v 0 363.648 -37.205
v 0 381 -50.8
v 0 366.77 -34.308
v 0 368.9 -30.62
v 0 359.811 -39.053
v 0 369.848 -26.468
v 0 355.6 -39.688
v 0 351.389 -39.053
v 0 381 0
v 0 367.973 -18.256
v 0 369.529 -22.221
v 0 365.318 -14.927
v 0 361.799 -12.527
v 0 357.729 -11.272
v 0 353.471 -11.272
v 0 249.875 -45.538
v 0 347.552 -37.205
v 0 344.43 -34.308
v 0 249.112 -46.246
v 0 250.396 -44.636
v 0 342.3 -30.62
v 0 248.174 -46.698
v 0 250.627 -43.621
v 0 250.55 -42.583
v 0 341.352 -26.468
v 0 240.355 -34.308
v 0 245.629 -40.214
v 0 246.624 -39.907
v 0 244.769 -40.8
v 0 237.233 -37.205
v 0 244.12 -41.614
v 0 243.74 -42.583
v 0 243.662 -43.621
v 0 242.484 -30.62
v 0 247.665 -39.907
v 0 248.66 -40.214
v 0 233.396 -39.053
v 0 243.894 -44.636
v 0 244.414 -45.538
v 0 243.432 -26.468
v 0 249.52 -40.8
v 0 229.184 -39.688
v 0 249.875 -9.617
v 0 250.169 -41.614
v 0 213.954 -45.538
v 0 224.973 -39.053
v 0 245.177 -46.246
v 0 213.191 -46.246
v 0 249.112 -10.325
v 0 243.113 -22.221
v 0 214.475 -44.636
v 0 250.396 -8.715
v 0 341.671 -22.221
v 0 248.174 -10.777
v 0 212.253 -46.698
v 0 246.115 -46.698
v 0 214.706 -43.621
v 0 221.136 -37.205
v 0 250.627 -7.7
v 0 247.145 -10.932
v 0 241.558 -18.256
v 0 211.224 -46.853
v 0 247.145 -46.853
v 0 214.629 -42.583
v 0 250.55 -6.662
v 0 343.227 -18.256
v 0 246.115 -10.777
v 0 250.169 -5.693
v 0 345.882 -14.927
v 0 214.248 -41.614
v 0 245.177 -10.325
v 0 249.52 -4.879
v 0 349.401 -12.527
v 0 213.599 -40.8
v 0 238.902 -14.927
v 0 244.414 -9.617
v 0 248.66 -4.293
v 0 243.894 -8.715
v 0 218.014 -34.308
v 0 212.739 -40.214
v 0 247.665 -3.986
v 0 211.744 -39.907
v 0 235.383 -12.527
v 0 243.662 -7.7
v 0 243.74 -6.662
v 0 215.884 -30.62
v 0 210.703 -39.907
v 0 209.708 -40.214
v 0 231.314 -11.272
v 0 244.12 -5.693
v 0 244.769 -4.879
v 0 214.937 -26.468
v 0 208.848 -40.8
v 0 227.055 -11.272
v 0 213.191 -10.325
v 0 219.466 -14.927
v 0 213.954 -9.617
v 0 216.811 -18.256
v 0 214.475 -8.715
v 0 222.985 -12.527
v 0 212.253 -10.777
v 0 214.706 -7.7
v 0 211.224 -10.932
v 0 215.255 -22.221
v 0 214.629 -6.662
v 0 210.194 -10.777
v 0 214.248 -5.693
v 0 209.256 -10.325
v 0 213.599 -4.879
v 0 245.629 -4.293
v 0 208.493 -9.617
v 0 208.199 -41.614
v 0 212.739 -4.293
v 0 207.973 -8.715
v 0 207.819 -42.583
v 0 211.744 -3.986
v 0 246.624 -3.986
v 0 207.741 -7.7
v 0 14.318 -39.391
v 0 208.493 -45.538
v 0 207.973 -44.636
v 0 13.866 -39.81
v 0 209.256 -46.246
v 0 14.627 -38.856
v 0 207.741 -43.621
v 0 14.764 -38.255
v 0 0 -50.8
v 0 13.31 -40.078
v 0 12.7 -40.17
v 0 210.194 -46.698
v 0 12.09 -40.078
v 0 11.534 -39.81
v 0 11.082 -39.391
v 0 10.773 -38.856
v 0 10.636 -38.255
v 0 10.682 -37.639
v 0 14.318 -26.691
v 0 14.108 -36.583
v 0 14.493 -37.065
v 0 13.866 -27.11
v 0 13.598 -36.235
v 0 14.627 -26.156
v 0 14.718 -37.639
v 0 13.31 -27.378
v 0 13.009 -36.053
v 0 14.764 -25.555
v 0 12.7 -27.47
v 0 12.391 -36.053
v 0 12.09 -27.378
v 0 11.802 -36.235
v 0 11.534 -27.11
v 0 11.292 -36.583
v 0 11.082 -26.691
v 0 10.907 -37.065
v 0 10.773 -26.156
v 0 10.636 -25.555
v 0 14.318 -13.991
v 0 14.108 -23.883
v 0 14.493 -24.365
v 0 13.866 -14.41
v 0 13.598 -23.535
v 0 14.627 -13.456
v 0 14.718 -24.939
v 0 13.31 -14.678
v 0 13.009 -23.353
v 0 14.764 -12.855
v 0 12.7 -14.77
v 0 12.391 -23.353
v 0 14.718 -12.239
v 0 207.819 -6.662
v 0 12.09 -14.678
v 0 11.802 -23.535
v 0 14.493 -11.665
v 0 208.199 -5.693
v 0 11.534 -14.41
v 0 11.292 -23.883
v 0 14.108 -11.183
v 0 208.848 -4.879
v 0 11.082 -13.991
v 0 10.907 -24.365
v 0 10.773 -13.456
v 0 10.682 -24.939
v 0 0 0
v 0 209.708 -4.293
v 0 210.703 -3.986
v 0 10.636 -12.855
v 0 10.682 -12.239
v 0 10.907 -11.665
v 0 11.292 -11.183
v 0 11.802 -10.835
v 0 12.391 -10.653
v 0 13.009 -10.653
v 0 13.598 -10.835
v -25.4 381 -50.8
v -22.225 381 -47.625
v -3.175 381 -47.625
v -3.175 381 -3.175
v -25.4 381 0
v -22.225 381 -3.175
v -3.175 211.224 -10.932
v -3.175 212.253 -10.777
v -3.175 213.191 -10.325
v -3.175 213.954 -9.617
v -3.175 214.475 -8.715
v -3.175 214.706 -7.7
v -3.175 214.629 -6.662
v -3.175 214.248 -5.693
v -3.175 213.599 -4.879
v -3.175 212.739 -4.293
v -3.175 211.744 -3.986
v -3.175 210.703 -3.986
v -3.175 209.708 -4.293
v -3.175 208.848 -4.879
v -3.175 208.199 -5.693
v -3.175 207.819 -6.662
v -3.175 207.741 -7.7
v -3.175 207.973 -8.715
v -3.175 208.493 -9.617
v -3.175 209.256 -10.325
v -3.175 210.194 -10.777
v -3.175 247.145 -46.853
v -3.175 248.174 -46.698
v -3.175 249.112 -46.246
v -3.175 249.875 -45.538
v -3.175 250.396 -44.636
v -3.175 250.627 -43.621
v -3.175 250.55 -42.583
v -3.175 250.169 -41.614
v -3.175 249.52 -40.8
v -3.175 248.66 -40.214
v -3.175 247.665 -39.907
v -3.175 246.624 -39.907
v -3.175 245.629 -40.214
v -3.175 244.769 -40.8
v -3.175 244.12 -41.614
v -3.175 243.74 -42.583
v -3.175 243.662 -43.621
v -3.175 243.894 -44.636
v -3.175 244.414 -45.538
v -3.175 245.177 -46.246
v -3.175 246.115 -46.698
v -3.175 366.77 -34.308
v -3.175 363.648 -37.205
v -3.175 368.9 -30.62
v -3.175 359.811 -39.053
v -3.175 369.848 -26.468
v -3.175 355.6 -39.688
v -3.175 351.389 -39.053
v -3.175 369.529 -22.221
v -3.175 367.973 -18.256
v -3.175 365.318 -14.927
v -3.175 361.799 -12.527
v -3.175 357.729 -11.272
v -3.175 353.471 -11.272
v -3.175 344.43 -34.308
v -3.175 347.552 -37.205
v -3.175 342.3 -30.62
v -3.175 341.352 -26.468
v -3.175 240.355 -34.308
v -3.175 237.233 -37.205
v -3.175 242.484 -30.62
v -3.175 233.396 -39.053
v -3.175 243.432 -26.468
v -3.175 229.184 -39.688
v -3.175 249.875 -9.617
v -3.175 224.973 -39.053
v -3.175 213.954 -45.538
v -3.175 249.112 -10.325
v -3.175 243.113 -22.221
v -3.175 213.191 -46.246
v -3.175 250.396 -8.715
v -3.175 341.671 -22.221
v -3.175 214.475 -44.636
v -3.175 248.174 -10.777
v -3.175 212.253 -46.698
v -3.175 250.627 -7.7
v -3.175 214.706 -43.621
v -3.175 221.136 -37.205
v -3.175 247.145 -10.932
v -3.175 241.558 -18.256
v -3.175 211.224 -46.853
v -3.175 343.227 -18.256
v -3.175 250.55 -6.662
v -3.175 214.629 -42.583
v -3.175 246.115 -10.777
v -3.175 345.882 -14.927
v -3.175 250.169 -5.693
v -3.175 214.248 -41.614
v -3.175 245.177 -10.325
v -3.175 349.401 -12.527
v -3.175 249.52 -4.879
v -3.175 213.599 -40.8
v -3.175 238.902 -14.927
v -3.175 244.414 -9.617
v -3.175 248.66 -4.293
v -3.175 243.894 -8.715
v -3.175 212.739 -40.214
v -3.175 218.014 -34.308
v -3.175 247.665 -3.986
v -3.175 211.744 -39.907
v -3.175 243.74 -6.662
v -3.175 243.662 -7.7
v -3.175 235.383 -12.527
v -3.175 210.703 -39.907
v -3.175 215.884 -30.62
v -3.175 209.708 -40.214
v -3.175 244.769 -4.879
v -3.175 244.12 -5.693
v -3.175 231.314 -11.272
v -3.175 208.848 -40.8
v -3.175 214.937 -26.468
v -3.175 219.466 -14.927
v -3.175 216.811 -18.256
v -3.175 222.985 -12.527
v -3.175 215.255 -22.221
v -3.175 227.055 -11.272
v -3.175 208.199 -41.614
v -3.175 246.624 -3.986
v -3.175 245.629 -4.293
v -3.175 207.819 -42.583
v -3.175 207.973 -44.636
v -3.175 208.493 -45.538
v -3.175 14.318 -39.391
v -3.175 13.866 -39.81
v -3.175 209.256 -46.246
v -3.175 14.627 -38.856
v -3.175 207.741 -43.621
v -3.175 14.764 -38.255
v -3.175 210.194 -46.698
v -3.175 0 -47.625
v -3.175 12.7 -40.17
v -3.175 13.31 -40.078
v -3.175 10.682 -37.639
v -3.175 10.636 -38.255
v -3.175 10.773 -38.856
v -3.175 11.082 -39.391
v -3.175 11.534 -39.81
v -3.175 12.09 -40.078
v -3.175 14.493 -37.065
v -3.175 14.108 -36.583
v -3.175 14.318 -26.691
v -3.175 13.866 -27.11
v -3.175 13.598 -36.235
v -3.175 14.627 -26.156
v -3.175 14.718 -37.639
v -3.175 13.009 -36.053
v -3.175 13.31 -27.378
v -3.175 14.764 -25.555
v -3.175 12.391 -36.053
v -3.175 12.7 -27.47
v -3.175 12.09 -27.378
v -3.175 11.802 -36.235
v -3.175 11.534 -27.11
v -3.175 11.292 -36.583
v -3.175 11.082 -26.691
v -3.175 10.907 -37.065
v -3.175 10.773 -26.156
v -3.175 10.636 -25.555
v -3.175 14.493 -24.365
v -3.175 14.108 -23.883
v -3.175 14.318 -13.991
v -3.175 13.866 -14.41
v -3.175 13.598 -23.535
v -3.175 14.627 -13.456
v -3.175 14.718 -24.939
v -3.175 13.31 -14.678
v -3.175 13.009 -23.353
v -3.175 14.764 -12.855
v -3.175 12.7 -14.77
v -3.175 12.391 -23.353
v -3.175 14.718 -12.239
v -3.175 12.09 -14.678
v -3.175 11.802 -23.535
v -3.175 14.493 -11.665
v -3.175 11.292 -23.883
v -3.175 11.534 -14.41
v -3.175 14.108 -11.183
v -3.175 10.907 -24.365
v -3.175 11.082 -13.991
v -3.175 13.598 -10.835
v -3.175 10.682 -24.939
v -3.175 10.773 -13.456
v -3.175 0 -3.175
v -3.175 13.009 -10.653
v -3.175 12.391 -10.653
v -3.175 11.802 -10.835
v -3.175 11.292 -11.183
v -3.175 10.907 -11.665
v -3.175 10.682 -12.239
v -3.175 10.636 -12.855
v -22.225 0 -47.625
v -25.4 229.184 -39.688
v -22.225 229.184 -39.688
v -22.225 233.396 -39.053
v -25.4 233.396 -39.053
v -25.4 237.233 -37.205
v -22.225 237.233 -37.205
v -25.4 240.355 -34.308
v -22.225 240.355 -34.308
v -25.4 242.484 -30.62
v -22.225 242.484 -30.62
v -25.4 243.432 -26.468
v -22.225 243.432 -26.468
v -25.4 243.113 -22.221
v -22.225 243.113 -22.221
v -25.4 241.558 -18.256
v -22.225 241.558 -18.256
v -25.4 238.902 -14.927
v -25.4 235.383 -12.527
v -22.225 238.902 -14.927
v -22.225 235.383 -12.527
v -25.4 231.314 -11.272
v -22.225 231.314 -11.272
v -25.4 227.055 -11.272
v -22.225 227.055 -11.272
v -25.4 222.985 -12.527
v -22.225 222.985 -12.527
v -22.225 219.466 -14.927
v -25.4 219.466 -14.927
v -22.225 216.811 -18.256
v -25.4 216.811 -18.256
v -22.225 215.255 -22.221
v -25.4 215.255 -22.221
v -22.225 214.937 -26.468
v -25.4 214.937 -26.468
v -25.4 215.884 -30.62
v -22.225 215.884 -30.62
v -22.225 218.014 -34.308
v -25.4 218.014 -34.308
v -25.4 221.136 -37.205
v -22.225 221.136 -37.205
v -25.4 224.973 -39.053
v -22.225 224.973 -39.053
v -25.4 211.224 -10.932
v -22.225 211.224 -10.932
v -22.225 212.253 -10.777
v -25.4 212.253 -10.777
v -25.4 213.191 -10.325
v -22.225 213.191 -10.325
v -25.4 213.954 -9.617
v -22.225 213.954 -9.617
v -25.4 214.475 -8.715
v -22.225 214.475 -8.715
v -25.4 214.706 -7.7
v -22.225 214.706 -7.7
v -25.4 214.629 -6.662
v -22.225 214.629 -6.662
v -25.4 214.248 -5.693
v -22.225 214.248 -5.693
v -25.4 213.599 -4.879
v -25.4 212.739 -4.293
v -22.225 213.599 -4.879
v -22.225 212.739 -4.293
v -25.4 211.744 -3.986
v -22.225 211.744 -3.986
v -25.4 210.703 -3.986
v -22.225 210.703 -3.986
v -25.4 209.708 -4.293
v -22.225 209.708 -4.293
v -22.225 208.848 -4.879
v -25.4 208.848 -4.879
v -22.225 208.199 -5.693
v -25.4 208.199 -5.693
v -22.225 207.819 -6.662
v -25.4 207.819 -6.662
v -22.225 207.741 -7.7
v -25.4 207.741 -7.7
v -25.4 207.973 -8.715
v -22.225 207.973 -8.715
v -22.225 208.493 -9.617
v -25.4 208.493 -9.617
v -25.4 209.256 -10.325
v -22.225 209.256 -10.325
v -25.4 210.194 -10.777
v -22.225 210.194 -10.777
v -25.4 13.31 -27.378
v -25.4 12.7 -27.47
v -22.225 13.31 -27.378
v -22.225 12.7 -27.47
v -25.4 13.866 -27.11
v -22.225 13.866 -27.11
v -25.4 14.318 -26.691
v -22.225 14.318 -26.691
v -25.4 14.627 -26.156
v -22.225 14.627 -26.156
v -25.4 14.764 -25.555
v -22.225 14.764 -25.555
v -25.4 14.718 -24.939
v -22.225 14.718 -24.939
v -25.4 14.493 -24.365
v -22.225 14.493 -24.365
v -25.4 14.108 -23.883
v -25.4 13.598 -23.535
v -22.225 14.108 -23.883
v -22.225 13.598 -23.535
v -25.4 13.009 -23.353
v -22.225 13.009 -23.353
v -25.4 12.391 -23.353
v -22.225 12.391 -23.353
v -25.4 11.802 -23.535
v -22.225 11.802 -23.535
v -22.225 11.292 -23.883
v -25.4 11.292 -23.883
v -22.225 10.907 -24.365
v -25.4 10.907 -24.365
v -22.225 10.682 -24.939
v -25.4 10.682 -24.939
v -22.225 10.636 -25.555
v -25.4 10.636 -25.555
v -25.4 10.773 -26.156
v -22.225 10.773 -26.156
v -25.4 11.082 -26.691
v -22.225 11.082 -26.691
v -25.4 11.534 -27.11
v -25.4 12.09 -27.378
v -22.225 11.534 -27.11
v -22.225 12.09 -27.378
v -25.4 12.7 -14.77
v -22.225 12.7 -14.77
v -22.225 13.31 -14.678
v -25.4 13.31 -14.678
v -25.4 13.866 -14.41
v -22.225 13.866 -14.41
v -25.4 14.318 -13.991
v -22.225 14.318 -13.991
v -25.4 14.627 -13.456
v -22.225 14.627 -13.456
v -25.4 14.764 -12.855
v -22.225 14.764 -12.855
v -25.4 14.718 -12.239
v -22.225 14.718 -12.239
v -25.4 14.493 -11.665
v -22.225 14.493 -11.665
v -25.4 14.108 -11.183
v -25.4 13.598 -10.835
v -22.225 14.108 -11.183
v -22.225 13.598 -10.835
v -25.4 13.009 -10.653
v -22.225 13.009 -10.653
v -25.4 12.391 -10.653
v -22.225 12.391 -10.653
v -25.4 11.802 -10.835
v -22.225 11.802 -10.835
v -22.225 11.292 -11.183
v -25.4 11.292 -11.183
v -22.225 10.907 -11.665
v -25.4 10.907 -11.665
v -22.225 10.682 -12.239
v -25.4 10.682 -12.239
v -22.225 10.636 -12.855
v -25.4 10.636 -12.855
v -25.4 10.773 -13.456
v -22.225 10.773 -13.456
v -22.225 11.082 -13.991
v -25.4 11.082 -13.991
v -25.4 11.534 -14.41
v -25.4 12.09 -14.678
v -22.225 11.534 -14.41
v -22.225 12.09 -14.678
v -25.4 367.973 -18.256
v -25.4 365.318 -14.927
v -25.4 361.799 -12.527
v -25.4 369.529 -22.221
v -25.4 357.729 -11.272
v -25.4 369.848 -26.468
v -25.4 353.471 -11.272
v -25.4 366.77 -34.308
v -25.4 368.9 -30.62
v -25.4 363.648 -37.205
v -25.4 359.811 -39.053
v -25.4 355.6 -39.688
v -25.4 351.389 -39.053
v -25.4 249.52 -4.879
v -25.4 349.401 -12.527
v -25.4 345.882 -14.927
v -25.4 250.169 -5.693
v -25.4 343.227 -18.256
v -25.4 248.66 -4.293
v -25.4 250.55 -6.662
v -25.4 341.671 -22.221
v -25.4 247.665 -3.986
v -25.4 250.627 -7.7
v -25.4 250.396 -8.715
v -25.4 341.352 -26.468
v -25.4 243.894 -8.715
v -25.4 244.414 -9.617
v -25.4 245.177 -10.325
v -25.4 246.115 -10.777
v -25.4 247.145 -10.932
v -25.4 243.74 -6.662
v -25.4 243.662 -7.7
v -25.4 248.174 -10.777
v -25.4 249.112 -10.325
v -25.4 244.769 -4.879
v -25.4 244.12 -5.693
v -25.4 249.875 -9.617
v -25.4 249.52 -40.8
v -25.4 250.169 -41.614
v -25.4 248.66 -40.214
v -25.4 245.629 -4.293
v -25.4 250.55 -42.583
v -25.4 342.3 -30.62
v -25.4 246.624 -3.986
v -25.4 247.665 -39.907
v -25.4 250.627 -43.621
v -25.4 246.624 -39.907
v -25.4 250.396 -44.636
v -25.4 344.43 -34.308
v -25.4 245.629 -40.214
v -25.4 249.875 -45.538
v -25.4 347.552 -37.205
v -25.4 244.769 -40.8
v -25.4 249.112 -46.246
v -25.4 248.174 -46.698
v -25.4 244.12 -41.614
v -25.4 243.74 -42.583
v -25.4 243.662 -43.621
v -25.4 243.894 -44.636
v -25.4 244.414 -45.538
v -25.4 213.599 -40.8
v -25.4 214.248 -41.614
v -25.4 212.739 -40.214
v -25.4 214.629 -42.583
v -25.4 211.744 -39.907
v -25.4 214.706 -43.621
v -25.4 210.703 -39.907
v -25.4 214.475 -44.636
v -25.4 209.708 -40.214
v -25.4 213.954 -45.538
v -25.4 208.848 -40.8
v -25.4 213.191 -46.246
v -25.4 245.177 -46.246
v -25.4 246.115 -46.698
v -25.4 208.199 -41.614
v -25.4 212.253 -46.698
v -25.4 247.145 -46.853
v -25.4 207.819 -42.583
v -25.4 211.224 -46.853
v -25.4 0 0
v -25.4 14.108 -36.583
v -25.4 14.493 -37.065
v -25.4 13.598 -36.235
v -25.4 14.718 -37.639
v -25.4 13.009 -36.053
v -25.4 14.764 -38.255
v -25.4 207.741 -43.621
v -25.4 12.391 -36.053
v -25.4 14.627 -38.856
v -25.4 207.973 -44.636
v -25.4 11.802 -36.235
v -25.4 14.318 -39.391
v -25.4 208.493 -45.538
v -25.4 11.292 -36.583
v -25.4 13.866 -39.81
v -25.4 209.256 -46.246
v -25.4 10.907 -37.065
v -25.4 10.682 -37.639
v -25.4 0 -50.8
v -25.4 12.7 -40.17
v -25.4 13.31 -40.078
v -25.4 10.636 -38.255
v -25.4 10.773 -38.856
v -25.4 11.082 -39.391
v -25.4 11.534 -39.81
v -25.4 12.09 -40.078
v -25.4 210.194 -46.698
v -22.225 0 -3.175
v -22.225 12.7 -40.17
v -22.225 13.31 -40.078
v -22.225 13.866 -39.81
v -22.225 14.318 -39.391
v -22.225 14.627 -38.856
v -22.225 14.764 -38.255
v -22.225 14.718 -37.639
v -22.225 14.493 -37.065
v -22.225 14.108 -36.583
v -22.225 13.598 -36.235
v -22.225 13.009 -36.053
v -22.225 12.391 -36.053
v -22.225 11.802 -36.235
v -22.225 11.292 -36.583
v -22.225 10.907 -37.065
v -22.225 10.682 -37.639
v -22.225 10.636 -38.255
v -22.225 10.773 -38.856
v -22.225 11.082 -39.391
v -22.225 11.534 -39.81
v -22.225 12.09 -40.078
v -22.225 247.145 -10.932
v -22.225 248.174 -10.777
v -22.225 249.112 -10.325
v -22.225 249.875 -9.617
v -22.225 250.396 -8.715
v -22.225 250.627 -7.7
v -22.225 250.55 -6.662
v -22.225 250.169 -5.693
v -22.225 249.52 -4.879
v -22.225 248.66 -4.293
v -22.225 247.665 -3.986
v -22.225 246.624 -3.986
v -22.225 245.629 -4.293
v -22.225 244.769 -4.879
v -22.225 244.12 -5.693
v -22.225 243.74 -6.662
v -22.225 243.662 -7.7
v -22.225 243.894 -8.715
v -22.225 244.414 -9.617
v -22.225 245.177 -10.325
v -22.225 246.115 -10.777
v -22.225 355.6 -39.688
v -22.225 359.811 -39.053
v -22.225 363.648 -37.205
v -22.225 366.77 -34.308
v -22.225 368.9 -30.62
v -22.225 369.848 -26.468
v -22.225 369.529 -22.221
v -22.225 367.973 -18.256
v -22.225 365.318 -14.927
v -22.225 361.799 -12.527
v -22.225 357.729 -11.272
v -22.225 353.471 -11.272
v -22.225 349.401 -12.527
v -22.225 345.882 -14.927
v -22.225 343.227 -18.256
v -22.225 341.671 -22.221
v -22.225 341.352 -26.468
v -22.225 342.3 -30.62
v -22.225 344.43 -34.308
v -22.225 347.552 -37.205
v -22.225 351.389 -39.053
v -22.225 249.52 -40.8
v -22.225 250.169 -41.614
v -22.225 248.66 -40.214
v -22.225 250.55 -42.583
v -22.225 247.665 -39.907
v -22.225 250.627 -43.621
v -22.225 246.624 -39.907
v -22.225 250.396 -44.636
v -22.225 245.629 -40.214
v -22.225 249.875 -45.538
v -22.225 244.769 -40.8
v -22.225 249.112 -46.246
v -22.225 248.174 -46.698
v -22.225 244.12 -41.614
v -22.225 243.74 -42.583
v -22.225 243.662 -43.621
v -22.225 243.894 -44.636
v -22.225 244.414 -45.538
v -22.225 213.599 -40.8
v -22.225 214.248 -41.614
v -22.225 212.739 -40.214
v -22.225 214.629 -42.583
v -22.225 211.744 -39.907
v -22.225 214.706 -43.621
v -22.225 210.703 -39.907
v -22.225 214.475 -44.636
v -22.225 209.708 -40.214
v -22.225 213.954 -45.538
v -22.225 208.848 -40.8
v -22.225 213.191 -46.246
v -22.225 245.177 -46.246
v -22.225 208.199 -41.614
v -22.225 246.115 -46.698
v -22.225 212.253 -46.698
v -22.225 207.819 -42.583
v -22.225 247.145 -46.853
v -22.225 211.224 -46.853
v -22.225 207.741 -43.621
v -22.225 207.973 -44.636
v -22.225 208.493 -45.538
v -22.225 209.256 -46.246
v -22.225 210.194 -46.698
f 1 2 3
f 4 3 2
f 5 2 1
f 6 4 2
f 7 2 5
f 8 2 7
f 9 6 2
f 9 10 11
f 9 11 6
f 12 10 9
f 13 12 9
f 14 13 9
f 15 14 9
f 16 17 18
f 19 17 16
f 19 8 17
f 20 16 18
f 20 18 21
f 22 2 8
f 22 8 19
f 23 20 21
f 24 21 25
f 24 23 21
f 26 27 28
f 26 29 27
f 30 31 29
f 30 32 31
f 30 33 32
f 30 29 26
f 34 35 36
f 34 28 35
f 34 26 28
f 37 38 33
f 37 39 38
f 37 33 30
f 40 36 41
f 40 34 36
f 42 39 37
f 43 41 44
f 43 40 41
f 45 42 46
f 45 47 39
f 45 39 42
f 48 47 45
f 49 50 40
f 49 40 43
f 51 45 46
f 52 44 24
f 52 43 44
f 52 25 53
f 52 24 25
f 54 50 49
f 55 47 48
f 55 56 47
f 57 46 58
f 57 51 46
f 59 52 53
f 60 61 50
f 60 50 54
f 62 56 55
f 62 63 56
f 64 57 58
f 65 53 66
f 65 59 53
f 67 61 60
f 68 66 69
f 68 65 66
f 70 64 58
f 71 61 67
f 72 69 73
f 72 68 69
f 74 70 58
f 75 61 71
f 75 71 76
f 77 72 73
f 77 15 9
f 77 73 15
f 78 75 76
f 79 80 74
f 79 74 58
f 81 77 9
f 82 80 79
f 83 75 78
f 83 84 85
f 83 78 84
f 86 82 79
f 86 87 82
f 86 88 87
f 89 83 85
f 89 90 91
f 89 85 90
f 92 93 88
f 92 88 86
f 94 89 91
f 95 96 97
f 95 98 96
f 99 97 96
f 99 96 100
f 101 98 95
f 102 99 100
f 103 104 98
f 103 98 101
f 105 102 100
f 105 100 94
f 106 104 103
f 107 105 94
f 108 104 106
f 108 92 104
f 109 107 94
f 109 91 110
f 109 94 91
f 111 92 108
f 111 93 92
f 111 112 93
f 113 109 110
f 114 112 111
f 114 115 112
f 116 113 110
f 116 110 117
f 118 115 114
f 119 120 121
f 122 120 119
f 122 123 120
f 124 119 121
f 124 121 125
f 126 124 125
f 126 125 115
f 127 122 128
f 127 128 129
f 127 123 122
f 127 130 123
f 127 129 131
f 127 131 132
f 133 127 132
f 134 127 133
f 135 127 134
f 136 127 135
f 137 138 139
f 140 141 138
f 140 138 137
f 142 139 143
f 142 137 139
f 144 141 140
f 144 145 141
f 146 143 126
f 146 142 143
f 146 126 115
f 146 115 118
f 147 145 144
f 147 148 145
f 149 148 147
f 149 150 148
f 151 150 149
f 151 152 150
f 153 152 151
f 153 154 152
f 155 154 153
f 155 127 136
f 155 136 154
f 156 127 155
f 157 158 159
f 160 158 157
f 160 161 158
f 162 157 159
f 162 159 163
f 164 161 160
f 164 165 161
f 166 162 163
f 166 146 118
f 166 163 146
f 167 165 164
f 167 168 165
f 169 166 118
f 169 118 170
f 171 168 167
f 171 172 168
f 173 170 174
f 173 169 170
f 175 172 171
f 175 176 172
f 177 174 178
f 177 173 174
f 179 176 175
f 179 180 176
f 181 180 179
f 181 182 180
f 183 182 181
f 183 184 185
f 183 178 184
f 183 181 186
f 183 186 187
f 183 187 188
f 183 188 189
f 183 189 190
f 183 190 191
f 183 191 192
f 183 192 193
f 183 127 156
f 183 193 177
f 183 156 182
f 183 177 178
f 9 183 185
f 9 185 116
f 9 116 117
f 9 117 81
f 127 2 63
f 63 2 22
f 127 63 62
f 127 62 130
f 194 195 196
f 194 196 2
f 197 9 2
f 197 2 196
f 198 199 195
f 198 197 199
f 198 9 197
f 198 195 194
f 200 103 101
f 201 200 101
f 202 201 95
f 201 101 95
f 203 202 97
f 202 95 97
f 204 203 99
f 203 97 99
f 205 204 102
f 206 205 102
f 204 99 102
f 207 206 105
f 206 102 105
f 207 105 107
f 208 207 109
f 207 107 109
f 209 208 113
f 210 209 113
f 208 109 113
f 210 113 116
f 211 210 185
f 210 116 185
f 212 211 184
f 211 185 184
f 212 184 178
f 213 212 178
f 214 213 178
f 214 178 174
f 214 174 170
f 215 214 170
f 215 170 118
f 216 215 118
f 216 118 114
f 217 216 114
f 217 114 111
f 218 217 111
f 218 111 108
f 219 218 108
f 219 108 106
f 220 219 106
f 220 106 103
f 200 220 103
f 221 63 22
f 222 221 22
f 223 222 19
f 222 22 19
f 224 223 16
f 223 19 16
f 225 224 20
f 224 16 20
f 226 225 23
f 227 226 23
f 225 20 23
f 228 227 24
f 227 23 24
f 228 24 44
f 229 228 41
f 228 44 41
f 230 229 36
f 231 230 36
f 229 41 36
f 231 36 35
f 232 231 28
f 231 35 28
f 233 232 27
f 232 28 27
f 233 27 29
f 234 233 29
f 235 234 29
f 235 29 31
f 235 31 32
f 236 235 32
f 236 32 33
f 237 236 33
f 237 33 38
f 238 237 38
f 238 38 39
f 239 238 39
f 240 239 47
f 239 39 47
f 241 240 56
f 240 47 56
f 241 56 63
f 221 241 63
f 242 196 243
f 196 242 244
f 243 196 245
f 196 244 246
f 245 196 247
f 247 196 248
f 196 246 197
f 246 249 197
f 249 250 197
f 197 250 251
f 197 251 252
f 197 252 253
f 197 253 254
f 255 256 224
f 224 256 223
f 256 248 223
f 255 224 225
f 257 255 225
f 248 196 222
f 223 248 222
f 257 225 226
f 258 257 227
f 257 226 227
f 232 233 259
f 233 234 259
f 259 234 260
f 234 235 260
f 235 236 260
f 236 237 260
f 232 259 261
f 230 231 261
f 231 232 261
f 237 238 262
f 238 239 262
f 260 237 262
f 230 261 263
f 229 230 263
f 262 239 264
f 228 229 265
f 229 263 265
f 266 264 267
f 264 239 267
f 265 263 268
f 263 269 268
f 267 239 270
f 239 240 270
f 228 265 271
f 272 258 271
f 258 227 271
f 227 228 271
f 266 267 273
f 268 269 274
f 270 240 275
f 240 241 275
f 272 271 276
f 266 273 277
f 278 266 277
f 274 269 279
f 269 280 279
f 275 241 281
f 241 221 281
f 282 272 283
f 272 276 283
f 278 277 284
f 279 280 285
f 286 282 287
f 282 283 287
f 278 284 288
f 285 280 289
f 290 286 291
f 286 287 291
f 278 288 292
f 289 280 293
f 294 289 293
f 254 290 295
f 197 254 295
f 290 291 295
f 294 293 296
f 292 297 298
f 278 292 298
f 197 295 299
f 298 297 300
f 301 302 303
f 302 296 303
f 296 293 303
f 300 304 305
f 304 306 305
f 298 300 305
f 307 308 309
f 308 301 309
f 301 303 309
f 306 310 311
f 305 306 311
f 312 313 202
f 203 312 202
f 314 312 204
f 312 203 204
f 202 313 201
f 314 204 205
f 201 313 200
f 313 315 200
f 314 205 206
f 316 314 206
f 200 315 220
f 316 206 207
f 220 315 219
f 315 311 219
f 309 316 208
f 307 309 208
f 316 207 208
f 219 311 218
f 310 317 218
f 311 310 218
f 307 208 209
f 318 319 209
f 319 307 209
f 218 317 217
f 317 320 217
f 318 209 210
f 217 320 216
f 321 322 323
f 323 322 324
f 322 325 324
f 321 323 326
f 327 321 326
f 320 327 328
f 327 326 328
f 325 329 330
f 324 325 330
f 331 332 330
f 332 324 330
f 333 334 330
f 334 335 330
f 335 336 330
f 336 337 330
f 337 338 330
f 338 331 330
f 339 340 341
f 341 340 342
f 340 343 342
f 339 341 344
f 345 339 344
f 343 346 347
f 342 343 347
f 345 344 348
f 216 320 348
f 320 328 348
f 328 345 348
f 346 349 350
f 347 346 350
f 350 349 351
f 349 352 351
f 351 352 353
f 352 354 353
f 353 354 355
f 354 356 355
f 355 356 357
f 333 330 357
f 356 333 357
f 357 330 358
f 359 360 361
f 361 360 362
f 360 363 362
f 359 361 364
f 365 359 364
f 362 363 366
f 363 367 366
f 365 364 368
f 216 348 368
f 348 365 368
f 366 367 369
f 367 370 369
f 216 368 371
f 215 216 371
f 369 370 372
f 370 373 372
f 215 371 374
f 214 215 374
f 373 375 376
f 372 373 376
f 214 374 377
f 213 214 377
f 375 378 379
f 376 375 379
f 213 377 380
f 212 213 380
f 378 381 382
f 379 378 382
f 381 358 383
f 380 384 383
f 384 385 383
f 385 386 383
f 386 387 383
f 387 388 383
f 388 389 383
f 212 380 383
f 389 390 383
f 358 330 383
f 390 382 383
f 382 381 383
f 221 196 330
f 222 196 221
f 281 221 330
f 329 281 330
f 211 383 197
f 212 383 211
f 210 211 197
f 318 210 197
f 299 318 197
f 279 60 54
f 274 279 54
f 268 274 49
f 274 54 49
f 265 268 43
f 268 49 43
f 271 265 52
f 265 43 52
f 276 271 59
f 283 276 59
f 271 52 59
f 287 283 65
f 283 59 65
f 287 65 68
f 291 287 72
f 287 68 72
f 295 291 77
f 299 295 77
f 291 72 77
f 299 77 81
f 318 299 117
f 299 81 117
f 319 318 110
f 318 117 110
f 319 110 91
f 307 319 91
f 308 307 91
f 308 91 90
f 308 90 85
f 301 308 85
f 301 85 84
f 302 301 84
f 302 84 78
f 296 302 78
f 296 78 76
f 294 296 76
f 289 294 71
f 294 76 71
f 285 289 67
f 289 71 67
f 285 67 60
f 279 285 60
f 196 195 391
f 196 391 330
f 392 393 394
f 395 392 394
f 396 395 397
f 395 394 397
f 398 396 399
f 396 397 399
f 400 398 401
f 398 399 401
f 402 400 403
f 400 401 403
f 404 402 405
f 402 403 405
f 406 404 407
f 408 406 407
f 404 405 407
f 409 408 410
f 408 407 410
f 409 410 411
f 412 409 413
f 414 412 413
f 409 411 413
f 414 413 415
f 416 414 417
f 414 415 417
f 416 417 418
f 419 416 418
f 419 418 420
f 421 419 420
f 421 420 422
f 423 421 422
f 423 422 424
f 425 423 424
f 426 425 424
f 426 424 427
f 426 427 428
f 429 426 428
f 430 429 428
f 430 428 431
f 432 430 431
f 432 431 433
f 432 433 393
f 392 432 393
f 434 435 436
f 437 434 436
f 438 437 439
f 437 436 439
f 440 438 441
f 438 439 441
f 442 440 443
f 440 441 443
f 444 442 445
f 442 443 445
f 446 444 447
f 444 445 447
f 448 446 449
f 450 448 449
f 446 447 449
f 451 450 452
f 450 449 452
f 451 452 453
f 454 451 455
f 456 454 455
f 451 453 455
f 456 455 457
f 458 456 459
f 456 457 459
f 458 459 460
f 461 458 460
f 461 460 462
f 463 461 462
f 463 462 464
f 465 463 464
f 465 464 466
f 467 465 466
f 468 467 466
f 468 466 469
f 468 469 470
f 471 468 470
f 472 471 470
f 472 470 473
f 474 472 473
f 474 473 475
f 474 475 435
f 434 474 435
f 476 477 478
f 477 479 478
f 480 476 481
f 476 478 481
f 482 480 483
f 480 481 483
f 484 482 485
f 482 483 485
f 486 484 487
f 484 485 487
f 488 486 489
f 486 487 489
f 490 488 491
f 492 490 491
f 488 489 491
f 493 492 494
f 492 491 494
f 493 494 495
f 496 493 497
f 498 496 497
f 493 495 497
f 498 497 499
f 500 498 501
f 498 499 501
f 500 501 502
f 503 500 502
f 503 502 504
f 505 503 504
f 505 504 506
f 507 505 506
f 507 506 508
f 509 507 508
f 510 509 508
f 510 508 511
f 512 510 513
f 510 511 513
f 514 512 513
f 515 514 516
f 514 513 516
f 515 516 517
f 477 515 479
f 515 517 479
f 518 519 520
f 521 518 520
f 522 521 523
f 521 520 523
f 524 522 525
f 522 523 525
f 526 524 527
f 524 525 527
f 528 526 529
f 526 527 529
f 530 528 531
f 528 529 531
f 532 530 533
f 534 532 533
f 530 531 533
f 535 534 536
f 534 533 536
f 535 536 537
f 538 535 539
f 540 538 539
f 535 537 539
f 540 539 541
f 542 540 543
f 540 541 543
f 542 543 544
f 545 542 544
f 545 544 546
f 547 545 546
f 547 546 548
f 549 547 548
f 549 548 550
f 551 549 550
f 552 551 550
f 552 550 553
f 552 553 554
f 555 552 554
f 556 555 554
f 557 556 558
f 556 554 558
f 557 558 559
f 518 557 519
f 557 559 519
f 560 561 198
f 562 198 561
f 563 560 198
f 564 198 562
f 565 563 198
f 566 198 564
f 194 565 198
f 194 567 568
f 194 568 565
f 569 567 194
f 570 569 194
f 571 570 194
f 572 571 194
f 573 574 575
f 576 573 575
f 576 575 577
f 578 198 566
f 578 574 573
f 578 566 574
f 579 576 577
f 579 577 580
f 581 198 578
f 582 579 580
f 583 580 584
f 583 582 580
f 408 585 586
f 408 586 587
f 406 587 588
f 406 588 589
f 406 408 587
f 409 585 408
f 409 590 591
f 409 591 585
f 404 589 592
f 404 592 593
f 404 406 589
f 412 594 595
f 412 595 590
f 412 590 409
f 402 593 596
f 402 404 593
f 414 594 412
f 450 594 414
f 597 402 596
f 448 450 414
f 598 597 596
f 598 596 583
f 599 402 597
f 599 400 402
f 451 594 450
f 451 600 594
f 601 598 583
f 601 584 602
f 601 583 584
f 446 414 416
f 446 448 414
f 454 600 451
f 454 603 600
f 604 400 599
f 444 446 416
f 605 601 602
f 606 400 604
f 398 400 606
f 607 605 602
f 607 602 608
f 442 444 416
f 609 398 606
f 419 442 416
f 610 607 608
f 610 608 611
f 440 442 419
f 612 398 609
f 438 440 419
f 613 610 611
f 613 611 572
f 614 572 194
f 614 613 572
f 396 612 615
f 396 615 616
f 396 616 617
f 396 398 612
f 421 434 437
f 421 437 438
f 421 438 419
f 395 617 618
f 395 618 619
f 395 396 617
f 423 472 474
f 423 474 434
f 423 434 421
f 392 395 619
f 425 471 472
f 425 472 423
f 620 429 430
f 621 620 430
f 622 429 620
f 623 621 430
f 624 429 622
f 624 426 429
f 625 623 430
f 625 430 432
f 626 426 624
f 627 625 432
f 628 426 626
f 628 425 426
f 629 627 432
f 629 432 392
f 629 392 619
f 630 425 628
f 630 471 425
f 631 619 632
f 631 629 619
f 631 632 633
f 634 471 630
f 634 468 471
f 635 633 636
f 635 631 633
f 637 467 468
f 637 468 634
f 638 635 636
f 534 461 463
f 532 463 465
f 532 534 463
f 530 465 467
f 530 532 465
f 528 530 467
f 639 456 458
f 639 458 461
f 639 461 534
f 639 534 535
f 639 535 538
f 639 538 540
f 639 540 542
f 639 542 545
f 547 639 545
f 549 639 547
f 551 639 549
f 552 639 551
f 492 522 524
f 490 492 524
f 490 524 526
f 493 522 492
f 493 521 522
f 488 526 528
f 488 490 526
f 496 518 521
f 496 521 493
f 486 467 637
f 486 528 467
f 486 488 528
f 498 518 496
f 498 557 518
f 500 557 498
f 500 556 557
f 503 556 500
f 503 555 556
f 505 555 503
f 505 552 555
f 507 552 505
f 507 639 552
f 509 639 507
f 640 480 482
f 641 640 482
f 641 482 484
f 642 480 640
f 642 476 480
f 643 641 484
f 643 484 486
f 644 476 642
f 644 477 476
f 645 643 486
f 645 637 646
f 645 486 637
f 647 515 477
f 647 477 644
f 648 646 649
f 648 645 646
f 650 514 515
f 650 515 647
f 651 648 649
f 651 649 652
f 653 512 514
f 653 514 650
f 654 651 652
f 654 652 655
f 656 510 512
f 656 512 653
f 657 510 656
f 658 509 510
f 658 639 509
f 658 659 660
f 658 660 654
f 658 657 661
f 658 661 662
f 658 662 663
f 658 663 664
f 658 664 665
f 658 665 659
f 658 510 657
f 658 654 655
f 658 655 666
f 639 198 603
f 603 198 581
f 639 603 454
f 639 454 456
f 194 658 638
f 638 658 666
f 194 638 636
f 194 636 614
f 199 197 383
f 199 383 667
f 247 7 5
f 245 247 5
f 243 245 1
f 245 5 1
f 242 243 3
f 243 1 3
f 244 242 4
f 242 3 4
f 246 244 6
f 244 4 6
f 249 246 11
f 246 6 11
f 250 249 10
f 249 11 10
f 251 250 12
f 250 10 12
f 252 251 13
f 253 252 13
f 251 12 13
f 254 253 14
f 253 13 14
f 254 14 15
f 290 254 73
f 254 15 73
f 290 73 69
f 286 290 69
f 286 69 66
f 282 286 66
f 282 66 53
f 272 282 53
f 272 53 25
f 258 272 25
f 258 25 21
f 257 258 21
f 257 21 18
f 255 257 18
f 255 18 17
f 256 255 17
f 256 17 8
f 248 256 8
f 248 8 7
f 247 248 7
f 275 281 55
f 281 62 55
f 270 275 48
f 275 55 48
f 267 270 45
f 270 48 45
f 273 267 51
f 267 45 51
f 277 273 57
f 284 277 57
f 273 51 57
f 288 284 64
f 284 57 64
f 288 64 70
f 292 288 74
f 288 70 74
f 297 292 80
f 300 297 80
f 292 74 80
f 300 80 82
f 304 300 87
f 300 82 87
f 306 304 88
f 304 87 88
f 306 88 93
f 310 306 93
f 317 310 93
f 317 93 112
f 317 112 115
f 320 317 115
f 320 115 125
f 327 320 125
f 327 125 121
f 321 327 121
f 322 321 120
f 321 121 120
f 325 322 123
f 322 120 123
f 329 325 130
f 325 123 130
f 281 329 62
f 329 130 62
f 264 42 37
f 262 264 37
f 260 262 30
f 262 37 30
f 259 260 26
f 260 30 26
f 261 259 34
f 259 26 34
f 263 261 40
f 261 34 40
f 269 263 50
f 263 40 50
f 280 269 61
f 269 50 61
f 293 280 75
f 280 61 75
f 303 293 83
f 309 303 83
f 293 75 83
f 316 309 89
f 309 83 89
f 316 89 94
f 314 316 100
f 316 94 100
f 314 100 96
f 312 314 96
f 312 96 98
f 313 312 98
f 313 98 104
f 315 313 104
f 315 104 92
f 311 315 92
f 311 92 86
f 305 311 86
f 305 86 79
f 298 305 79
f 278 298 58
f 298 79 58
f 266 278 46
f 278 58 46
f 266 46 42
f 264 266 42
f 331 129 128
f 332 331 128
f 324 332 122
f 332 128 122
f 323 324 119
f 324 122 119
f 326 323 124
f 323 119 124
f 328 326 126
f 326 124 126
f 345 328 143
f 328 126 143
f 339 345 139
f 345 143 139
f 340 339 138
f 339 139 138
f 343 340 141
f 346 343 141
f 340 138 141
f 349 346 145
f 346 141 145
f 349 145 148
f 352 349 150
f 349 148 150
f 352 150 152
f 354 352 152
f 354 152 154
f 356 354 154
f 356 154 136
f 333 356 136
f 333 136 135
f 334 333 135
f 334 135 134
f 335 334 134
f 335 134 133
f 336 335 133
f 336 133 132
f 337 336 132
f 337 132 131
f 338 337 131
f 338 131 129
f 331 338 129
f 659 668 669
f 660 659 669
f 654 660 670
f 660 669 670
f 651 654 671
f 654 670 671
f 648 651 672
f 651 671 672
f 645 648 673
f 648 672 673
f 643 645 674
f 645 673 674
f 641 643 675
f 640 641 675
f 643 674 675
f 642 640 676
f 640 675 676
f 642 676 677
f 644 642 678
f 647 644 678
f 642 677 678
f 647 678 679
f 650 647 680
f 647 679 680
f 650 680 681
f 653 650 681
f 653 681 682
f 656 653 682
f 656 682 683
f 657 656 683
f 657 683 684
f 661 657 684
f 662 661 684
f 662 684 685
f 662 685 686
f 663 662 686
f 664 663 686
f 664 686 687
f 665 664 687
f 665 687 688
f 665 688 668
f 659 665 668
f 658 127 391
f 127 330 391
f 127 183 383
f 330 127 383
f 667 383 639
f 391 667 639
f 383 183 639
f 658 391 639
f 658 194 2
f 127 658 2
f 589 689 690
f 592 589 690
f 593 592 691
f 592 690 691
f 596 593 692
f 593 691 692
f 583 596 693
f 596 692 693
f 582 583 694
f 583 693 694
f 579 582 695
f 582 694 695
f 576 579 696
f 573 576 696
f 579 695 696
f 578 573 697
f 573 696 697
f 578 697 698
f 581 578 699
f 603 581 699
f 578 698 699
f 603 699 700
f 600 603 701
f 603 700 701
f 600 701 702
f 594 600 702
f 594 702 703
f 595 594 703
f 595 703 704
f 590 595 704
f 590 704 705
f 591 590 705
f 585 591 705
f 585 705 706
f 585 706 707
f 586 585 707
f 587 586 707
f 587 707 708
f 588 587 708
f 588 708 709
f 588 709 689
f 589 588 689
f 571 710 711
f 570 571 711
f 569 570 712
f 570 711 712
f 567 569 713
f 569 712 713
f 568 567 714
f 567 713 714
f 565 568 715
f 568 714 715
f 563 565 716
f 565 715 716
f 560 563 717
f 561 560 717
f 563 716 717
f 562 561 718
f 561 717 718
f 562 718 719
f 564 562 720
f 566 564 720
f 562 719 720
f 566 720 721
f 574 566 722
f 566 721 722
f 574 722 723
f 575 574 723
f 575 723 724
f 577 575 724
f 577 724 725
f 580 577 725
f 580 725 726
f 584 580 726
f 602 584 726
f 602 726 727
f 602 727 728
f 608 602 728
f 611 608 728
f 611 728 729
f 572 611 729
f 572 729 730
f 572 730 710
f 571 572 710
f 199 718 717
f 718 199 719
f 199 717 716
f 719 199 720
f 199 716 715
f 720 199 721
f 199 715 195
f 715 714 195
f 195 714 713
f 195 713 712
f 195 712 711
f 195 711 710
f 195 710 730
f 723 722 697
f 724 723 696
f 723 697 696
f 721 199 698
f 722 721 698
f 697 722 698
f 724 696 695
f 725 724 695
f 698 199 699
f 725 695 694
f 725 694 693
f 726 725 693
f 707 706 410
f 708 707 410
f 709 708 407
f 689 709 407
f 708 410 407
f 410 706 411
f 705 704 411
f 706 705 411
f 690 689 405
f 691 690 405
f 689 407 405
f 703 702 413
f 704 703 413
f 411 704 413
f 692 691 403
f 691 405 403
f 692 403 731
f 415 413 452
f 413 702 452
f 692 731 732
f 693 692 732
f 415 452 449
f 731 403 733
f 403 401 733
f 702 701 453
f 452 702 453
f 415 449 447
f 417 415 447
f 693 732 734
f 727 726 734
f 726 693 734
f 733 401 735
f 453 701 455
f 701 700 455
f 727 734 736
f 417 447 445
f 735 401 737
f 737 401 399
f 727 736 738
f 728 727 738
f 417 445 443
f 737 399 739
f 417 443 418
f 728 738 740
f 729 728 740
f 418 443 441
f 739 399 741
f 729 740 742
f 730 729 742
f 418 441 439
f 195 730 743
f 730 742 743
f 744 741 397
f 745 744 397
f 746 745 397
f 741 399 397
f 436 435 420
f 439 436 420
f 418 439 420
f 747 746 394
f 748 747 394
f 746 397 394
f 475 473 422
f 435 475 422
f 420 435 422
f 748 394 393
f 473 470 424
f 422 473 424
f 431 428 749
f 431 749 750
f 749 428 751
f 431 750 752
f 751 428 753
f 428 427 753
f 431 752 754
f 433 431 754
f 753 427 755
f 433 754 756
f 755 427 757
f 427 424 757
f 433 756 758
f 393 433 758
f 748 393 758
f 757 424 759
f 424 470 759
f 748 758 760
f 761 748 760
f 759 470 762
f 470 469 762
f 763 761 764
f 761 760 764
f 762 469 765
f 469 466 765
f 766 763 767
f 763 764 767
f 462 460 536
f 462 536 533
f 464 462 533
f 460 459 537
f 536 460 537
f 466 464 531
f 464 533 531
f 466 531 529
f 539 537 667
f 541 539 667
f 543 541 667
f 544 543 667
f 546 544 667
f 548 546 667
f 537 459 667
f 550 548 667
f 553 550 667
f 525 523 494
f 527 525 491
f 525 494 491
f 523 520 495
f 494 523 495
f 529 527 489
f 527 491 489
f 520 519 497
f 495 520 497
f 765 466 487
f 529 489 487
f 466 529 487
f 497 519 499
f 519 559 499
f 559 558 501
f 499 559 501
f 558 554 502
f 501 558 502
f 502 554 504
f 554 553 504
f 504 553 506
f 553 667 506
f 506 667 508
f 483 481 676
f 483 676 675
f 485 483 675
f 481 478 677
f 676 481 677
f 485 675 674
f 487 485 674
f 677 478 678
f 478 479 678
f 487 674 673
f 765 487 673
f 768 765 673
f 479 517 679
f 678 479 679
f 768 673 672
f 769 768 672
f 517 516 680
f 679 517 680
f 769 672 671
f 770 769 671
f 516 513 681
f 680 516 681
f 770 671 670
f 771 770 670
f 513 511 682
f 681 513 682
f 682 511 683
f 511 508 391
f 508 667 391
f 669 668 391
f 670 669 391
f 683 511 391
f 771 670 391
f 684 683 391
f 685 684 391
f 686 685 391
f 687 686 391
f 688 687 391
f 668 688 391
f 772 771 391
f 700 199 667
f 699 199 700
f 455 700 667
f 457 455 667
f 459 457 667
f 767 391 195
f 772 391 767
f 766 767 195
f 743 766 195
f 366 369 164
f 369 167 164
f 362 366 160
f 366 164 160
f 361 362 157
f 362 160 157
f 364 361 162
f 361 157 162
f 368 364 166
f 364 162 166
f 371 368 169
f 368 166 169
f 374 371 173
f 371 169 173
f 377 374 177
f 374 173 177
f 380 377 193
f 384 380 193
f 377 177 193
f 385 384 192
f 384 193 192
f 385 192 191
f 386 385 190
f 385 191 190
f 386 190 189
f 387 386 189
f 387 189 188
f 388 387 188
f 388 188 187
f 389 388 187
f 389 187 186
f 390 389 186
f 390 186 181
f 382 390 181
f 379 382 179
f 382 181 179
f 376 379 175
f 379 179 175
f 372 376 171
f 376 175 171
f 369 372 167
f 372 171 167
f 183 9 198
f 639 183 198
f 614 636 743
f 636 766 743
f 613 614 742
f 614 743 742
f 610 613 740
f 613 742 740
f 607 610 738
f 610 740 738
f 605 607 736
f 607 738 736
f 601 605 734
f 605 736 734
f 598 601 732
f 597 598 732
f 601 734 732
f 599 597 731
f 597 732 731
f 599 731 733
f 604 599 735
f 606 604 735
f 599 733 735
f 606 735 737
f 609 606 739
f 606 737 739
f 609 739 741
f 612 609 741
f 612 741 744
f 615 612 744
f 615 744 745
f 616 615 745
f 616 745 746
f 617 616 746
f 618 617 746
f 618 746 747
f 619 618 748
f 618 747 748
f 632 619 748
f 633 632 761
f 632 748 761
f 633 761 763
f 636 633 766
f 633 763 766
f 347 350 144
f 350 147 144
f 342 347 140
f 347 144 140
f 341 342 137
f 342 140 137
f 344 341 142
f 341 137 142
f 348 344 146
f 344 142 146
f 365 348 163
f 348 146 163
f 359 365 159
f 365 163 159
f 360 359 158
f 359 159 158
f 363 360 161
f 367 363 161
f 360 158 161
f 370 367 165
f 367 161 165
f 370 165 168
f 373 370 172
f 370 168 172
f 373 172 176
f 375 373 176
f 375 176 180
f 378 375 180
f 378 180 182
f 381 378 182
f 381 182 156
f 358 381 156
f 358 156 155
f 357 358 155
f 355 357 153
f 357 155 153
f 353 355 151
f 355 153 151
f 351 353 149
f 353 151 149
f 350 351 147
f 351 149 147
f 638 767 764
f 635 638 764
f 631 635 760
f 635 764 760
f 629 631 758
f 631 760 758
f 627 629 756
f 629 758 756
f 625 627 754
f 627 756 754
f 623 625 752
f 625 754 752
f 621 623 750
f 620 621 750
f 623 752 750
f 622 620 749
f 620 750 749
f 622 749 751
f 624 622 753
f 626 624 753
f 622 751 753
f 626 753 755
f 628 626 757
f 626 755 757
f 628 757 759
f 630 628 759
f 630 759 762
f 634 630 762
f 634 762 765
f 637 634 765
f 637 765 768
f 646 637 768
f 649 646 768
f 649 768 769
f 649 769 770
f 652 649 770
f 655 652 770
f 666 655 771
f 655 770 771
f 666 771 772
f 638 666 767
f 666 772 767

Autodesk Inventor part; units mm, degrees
ref_plane "YZ Plane" through (0, 0, 0) normal (1, 0, 0) x (0, 1, 0)
ref_plane "XZ Plane" through (0, 0, 0) normal (0, 1, 0) x (-1, 0, 0)
ref_plane "XY Plane" through (0, 0, 0) normal (0, 0, 1) x (1, 0, 0)
sketch "Sketch1" plane through (0, 0, 0) normal (0, 1, 0) x (-1, 0, 0)
  line L0 (0, 0) -> (25.4, 0)
  line L1 (25.4, 0) -> (25.4, -50.8)
  line L2 (25.4, -50.8) -> (0, -50.8)
  line L3 (0, -50.8) -> (0, 0)
  dimension "d0" = 25.4
  dimension "d1" = 50.8
extrude "Extrusion1" add sketch "Sketch1" along normal blind 381
shell "Shell1" thickness 3.175 removed faces 2 at (-8.4667, 0, -33.8667) at (-8.4667, 381, -33.8667)
sketch "Sketch2" plane through (0, 0, 0) normal (1, 0, 0) x (0, 0, -1)
  line L0 (0, 0) -> (0, 381) projected
  line L1 (0, 12.7) -> (50.8, 12.7)
  line L2 (50.8, 0) -> (50.8, 381) projected
  circle A0 centre (25.4, 12.7) radius 2.0701
  circle A1 centre (38.1, 12.7) radius 2.0701
  circle A2 centre (12.7, 12.7) radius 2.0701
  line L3 (0, 0) -> (50.8, 0) projected
  line L4 (3.175, 381) -> (47.625, 381) projected
  line L5 (25.4, 381) -> (25.4, 355.6)
  circle A3 centre (25.4, 355.6) radius 14.2875
  line L6 (25.4, 355.6) -> (25.4, 229.1842)
  circle A4 centre (25.4, 229.1842) radius 14.2875
  circle A5 centre (25.4, 229.1842) radius 25.4 construction
  line L7 (25.4, 229.1842) -> (43.3605, 247.1447) construction
  line L8 (25.4, 229.1842) -> (50.8, 229.1842) construction
  line L9 (25.4, 229.1842) -> (43.3605, 211.2237) construction
  line L10 (25.4, 229.1842) -> (7.4395, 211.2237) construction
  line L11 (25.4, 229.1842) -> (7.4395, 247.1447) construction
  circle A6 centre (7.4395, 247.1447) radius 3.4925
  circle A7 centre (43.3605, 247.1447) radius 3.4925
  circle A8 centre (43.3605, 211.2237) radius 3.4925
  circle A9 centre (7.4395, 211.2237) radius 3.4925
  dimension "d5" = 4.1402
  dimension "d8" = 12.7
  dimension "d15" = 12.7
  dimension "d22" = 12.7
  dimension "d23" = 25.4
  dimension "d24" = 28.575
  dimension "d25" = 28.575
  dimension "d26" = 126.4158
  dimension "d27" = 50.8
  dimension "d28" = 45
  dimension "d29" = 6.985
  dimension "d30" = 6.985
  dimension "d31" = 6.985
  dimension "d32" = 6.985
extrude "Extrusion2" cut sketch "Sketch2" against normal through all contours A2 L1 | L1 A2 | A1 L1 | L1 A1 | A0 L1 | L1 A0 | A3 L6 L5 | A4 | L5 L6 A3 | A6 | A7 | A8 | A9
properties part number "Arm Mount"
